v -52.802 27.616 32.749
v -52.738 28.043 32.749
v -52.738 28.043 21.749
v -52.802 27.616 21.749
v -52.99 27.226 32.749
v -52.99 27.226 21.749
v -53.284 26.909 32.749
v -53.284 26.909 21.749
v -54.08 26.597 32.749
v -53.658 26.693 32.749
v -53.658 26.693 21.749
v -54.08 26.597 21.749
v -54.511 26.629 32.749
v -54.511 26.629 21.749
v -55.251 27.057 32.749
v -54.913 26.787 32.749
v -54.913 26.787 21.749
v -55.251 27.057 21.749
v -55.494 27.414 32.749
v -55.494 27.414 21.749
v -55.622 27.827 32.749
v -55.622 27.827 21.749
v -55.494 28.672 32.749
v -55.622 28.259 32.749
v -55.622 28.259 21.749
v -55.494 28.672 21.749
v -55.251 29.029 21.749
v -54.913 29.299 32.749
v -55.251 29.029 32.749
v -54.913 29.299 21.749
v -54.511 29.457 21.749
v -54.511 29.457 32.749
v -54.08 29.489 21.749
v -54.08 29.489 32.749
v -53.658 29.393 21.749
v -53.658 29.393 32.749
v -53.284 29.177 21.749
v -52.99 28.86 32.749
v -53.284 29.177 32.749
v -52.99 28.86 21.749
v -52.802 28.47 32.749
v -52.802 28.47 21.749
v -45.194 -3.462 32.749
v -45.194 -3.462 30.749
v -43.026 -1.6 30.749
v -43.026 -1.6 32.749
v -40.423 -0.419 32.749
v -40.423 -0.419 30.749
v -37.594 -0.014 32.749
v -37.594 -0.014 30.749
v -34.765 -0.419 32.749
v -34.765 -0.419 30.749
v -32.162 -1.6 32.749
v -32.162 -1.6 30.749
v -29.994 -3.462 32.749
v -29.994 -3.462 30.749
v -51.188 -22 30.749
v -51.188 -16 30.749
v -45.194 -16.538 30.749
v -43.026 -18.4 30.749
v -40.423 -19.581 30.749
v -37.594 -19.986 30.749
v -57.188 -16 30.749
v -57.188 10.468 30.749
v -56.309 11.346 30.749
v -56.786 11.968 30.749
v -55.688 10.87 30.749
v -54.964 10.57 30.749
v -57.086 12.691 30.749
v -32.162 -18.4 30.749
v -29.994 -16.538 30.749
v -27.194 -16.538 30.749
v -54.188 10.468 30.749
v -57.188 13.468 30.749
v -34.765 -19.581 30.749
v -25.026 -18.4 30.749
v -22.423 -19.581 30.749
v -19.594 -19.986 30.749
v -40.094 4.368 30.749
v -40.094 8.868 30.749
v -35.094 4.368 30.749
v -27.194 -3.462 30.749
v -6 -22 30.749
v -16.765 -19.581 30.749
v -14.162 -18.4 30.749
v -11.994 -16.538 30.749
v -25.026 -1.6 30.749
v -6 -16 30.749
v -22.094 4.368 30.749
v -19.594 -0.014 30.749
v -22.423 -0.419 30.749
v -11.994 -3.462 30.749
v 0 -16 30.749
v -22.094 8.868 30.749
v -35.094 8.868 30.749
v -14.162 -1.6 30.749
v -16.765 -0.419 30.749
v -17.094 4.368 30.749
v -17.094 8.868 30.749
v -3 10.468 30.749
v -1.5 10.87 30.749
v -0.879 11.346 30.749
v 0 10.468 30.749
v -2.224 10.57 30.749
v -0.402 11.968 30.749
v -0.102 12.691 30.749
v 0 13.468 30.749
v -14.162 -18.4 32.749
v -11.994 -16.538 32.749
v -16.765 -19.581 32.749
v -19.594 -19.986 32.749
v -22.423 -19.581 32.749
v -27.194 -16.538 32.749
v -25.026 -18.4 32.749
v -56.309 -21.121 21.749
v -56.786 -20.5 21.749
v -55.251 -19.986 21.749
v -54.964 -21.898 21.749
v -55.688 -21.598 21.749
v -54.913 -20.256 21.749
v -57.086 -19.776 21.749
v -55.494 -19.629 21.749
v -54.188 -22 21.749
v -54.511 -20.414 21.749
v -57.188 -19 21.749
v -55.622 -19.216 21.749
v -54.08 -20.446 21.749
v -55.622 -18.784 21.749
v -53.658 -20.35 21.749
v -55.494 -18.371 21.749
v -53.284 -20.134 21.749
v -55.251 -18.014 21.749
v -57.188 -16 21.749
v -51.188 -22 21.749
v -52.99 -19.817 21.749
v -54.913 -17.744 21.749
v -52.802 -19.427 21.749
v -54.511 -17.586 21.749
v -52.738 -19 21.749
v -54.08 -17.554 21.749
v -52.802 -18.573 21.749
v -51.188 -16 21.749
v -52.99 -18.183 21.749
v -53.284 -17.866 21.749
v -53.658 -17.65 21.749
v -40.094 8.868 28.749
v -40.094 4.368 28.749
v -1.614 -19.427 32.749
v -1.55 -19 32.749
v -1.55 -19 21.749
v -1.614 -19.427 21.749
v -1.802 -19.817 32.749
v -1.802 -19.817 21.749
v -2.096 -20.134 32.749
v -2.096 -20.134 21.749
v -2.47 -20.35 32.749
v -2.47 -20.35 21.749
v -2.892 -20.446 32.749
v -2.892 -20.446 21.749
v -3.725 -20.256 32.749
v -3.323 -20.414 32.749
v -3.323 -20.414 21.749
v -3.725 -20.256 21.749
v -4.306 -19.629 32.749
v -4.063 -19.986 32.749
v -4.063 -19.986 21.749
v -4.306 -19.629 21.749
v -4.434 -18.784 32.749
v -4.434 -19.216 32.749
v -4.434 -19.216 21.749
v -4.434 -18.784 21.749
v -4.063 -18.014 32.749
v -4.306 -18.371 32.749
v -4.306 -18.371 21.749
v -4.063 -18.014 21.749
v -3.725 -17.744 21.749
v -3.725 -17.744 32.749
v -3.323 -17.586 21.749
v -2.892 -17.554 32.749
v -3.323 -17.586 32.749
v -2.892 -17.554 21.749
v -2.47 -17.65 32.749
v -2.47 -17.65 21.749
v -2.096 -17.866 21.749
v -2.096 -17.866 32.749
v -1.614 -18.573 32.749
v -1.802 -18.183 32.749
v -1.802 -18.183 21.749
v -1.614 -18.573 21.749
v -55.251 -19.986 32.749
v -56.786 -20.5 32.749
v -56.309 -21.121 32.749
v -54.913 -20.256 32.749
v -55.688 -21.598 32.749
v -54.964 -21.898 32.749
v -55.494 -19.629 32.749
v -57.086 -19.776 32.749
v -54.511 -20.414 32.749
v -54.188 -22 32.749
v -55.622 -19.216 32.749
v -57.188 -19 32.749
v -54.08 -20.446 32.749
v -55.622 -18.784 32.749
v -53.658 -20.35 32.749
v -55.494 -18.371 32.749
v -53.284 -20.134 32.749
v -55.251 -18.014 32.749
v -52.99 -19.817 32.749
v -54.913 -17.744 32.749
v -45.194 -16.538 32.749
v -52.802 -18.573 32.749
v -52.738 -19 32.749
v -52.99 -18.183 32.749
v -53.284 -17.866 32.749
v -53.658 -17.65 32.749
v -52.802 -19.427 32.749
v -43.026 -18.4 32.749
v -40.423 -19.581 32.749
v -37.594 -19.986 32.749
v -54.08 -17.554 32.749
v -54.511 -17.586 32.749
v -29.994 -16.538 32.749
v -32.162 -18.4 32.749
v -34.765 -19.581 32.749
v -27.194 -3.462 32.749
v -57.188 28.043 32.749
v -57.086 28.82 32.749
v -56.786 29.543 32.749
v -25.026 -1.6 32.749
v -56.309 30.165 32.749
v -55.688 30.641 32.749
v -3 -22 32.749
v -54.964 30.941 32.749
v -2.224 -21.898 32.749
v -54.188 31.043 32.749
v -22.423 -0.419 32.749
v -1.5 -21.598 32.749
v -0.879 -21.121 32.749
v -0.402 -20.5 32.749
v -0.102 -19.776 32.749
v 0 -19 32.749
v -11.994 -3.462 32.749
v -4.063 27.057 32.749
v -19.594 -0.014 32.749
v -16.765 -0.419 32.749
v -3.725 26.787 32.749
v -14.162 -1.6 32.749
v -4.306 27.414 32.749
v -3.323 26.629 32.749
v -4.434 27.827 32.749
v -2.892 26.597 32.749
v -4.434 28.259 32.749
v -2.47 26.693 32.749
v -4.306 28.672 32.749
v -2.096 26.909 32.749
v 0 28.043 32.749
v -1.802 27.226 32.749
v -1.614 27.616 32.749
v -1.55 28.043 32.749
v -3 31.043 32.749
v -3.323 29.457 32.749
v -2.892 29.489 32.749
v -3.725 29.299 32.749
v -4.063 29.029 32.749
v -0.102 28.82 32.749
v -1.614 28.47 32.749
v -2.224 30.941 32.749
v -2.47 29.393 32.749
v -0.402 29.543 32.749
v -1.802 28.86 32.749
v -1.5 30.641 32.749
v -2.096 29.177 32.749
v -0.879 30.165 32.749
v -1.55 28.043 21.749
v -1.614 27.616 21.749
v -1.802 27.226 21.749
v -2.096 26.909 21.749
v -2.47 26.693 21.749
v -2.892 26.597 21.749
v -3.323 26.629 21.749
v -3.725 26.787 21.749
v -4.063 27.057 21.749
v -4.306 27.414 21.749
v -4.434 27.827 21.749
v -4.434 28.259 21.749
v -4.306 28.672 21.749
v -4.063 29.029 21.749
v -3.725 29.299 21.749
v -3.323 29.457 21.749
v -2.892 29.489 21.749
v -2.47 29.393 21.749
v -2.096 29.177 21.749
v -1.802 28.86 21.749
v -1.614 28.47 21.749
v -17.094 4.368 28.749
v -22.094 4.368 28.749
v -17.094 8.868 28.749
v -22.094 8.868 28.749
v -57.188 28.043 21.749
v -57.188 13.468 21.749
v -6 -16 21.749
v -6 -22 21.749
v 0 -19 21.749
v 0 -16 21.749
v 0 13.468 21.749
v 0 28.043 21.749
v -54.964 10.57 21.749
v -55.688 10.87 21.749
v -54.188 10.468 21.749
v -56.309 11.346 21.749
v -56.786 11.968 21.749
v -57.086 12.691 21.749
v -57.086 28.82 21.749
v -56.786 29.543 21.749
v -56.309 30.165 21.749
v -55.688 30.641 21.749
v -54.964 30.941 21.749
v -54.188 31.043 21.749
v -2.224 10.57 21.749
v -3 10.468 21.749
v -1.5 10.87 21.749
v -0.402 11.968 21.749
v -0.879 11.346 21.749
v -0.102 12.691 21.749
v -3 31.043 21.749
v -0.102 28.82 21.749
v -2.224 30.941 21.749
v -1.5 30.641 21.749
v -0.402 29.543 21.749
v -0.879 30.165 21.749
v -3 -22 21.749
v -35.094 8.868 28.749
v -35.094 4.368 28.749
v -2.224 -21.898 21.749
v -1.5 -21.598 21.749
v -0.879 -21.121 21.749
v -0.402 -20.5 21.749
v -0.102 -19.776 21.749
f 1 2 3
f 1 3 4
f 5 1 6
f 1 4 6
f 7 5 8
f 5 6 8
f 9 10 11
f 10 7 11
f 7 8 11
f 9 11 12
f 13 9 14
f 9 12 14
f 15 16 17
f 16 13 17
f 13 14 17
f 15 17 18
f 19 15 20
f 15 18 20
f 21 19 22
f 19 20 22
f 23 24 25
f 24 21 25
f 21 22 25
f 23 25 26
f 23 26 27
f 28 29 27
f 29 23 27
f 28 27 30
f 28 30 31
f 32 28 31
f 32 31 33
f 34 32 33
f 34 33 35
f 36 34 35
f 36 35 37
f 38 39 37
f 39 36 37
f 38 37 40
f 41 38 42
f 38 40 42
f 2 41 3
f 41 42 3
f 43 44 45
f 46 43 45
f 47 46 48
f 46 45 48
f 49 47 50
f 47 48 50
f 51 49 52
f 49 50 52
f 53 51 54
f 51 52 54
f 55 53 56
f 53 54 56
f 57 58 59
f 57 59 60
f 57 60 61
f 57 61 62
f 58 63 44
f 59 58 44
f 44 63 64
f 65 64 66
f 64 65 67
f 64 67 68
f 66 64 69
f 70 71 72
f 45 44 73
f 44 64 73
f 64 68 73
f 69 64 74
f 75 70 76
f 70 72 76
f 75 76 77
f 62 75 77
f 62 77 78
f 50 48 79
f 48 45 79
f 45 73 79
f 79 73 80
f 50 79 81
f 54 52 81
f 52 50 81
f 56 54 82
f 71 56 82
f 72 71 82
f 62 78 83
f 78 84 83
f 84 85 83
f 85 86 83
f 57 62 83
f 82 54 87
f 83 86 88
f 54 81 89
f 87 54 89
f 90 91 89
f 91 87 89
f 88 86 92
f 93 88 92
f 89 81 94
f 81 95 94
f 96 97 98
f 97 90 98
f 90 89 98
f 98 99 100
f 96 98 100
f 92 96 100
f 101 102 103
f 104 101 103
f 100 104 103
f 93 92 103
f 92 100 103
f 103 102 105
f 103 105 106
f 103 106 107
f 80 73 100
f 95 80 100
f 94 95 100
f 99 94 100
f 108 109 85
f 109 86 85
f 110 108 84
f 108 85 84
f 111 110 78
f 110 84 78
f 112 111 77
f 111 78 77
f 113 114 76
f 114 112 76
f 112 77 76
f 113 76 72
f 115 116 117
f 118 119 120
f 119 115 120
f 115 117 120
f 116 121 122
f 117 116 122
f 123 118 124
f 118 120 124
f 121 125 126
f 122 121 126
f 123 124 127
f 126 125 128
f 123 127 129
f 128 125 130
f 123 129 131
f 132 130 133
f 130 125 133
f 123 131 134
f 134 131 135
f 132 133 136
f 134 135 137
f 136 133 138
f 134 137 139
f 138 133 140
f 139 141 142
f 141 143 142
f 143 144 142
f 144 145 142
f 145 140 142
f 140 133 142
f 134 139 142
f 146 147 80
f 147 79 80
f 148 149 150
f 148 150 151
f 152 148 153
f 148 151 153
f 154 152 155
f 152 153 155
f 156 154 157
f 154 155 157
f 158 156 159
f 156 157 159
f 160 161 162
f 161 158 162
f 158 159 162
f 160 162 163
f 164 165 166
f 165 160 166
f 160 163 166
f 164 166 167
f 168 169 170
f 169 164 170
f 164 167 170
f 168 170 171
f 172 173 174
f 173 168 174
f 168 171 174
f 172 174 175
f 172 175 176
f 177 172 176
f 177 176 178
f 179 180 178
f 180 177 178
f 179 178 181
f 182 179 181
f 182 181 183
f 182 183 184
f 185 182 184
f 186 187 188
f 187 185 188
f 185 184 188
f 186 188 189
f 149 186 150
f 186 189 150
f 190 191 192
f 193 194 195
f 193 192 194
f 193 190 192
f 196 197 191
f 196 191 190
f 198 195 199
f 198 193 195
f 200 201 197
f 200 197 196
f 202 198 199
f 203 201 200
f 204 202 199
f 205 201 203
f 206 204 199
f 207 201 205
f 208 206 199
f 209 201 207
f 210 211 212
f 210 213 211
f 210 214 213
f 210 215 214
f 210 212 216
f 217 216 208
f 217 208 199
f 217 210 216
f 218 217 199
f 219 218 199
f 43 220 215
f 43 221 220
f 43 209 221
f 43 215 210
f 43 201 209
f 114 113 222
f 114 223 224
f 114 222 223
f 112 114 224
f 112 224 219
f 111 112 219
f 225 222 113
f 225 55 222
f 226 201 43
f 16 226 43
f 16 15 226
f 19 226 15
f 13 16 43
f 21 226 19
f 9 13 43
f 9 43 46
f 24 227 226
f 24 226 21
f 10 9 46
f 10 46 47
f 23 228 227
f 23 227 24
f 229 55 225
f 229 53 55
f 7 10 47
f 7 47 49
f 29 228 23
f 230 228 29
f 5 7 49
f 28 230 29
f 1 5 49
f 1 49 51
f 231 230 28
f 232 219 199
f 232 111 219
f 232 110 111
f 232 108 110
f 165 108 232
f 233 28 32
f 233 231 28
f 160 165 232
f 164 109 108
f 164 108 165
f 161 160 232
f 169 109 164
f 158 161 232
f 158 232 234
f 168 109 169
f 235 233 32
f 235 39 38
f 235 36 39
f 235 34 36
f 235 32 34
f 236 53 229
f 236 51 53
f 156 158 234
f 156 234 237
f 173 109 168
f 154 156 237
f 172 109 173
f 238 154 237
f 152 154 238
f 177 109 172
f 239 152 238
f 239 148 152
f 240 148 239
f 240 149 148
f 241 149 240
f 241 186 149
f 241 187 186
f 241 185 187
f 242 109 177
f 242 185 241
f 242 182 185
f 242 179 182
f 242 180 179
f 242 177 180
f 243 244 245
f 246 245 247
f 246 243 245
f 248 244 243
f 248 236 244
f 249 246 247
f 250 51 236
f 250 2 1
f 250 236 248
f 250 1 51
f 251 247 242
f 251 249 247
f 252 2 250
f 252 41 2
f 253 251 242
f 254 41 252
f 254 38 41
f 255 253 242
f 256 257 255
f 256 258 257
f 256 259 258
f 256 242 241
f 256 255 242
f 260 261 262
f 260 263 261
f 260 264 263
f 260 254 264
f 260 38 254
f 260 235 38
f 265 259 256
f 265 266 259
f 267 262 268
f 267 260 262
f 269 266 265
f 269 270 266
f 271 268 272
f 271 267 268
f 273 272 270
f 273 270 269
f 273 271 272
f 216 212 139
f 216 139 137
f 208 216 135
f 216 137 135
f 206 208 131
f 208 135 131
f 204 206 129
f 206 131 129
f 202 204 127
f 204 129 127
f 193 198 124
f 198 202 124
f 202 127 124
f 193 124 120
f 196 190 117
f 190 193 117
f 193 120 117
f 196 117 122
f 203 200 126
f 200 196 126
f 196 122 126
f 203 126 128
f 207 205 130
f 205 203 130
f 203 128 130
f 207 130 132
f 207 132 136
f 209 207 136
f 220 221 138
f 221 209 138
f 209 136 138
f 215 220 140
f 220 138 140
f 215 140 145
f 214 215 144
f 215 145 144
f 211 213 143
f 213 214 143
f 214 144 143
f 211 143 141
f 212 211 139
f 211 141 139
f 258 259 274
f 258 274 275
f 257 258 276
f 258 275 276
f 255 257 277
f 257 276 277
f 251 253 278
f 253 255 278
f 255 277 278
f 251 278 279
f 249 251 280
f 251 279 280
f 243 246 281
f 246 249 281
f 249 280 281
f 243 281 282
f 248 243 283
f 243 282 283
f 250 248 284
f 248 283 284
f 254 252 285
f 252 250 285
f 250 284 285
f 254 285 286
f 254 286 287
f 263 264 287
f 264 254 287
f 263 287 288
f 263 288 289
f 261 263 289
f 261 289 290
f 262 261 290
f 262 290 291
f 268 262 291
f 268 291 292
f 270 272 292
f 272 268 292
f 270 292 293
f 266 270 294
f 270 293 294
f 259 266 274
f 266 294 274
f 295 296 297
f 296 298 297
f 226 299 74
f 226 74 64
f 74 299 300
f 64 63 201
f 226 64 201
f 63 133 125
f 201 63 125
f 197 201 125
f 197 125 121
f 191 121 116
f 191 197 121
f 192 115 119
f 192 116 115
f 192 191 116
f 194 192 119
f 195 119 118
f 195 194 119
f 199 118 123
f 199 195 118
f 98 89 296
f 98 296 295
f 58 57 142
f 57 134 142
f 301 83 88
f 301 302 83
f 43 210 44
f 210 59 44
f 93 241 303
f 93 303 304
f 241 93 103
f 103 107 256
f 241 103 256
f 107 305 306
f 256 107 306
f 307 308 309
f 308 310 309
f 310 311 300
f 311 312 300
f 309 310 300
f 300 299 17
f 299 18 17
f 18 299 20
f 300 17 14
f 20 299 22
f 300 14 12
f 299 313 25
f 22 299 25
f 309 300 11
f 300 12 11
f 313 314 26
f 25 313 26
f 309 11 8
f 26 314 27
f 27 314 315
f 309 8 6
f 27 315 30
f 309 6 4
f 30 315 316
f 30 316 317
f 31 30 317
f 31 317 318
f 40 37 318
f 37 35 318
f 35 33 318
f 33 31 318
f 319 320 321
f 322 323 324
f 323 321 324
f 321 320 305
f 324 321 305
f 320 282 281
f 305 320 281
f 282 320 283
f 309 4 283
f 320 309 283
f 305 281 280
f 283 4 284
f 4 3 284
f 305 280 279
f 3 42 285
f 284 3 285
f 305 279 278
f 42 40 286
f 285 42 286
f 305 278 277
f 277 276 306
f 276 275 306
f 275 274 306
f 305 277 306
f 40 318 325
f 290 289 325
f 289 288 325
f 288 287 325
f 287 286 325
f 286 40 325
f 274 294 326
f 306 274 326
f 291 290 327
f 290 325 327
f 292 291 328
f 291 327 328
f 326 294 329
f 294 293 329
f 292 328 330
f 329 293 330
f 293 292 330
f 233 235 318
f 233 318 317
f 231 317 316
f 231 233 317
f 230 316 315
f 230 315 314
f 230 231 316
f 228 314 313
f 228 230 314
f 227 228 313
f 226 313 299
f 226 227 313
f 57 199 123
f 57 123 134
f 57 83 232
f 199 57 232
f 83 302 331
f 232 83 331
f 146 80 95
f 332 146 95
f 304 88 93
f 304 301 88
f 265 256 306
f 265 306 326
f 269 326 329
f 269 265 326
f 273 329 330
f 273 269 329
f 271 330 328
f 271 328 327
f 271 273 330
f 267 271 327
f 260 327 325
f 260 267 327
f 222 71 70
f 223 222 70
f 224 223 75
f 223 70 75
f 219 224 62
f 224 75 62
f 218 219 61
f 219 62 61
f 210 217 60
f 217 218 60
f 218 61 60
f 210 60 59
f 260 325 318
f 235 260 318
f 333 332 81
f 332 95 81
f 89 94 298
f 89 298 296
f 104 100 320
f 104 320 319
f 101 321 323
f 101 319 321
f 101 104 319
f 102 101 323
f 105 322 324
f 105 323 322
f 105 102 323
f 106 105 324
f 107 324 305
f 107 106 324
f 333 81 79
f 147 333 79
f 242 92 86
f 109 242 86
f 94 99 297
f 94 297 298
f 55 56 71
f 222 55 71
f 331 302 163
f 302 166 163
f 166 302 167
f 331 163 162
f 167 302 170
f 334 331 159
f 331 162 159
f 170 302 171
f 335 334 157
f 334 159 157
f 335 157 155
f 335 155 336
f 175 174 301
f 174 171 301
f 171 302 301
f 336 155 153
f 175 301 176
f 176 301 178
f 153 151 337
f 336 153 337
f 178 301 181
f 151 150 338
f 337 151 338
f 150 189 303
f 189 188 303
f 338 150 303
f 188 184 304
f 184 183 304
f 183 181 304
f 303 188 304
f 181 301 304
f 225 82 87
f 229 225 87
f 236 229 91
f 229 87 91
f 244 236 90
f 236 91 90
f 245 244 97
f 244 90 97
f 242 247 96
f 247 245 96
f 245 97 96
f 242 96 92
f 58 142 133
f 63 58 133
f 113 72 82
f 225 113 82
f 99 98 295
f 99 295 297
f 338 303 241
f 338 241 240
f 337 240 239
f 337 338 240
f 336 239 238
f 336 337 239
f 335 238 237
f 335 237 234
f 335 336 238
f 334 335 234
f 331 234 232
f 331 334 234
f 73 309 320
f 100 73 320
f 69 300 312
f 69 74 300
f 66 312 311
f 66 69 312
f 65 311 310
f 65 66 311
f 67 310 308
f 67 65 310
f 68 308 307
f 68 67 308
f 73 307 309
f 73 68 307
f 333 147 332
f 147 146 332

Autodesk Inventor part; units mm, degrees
ref_plane "YZ Plane" through (0, 0, 0) normal (1, 0, 0) x (0, 1, 0)
ref_plane "XZ Plane" through (0, 0, 0) normal (0, 1, 0) x (-1, 0, 0)
ref_plane "Work Plane1" through (-29.0856, 4.4467, 21.749) normal (0, 0, 1) x (1, 0, 0)
ref_plane "Work Plane2" through (-5, -17, 36.649) normal (0, 0, -1) x (1, 0, 0)
ref_plane "Work Plane3" through (-40.5939, -3, 26.249) normal (0, 0, -1) x (0, 1, 0)
sketch "Sketch1" plane through (-29.0856, 4.4467, 21.749) normal (0, 0, 1) x (1, 0, 0)
  arc A0 (29.0856, 24.0967) -> (26.5856, 26.5967) centre (26.5856, 24.0967) ccw projected
  line L0 (26.5856, 26.5967) -> (-25.6023, 26.5967) projected
  arc A1 (-25.6023, 26.5967) -> (-28.1023, 24.0967) centre (-25.6023, 24.0967) ccw projected
  line L1 (-28.1023, 24.0967) -> (-28.1023, -23.9467) projected
  arc A2 (-28.1023, -23.9467) -> (-25.6023, -26.4467) centre (-25.6023, -23.9467) ccw projected
  line L2 (-25.6023, -26.4467) -> (26.5856, -26.4467) projected
  line L3 (29.0856, -23.9467) -> (29.0856, 24.0967)
  circle A3 centre (26.0856, -23.4467) radius 1.45 construction
  line L4 (0.4916, -38.3665) -> (0.4916, 43.9409) construction
  line L5 (29.0856, 26.5967) -> (-28.1023, 26.5967)
  line L6 (-28.1023, 26.5967) -> (-28.1023, 6.0209)
  line L7 (-28.1023, 6.0209) -> (29.0856, 6.0209)
  line L8 (29.0856, 6.0209) -> (29.0856, 26.5967)
  line L9 (30.8116, -0.0755) -> (30.8114, -0.0755)
  line L10 (29.0856, -23.9467) -> (29.0856, -26.4467)
  line L11 (29.0856, -26.4467) -> (26.5856, -26.4467)
  line L12 (-25.6023, -26.4467) -> (-28.1023, -26.4467)
  line L13 (-28.1023, -26.4467) -> (-28.1023, -23.9467)
  circle A4 centre (26.0856, -23.4467) radius 3 construction
  circle A5 centre (26.0856, -23.4467) radius 1.45
  circle A6 centre (-25.1024, -23.4467) radius 1.45 construction
  circle A7 centre (-25.1024, -23.4467) radius 1.45
  circle A8 centre (26.0856, 23.5963) radius 1.45 construction
  circle A9 centre (26.0856, 23.5963) radius 1.45
  circle A10 centre (-25.1024, 23.5963) radius 1.45 construction
  circle A11 centre (-25.1024, 23.5963) radius 1.45
  line L14 (29.0856, -26.4467) -> (23.0856, -26.4467)
  line L15 (23.0856, -26.4467) -> (23.0856, -20.4467)
  line L16 (23.0856, -20.4467) -> (29.0856, -20.4467)
  line L17 (29.0856, -20.4467) -> (29.0856, -26.4467)
  line L18 (-28.1023, -26.4467) -> (-22.1023, -26.4467)
  line L19 (-22.1023, -26.4467) -> (-22.1023, -20.4467)
  line L20 (-22.1023, -20.4467) -> (-28.1023, -20.4467)
  line L21 (-28.1023, -20.4467) -> (-28.1023, -26.4467)
  spline S0 degree 3 poles (31.7798, -5.9724) (31.66, -5.7823) (31.4802, -5.4972) (31.2591, -5.1058) (31.1003, -4.8085) (30.9498, -4.5069) (30.8081, -4.201) (30.6761, -3.8909) (30.5547, -3.5764) (30.4456, -3.2574) (30.3497, -2.9341) (30.2872, -2.6602) (30.2421, -2.4401) (30.1945, -2.2782) (30.1301, -2.1222) (30.0461, -1.9754) (29.9577, -1.8658) (29.8777, -1.7866) (29.8102, -1.7361) (29.741, -1.6877) (29.6647, -1.6516) (29.5872, -1.6181) (29.5051, -1.5983) (29.4223, -1.5815) (29.3098, -1.5775) (29.1694, -1.5801) (29.0291, -1.5775) (28.9165, -1.5815) (28.8338, -1.5983) (28.7517, -1.6181) (28.6742, -1.6516) (28.5979, -1.6877) (28.5287, -1.7361) (28.4611, -1.7866) (28.3812, -1.8658) (28.2927, -1.9754) (28.2088, -2.1222) (28.1444, -2.2782) (28.0967, -2.4401) (28.0516, -2.6602) (27.9892, -2.9341) (27.8932, -3.2574) (27.7842, -3.5764) (27.6628, -3.8909) (27.5307, -4.201) (27.389, -4.5069) (27.2385, -4.8085) (27.0797, -5.1058) (26.8587, -5.4972) (26.6789, -5.7823) (26.559, -5.9724) knots -1.0784 -1.0784 -1.0784 -1.0784 -1.010995 -0.977291 -0.943586 -0.909882 -0.876178 -0.842474 -0.80877 -0.775067 -0.741365 -0.707665 -0.690816 -0.67397 -0.657123 -0.640284 -0.623449 -0.615023 -0.606598 -0.598176 -0.589749 -0.581327 -0.572901 -0.564477 -0.556053 -0.5392 -0.522347 -0.513923 -0.505499 -0.497074 -0.488651 -0.480225 -0.471802 -0.463377 -0.454951 -0.438116 -0.421277 -0.40443 -0.387584 -0.370735 -0.337035 -0.303333 -0.26963 -0.235926 -0.202222 -0.168518 -0.134814 -0.101109 -0.067405 0 0 0 0 construction
  line L22 (26.559, -5.9724) -> (25.4968, -5.9724) construction
  spline S1 degree 3 poles (25.4968, -5.9724) (25.377, -5.7823) (25.1972, -5.4972) (24.9761, -5.1058) (24.8173, -4.8085) (24.6668, -4.5069) (24.5251, -4.201) (24.3931, -3.8909) (24.2717, -3.5764) (24.1626, -3.2574) (24.0667, -2.9341) (24.0042, -2.6602) (23.9591, -2.4401) (23.9115, -2.2782) (23.8471, -2.1222) (23.7631, -1.9754) (23.6747, -1.8658) (23.5947, -1.7866) (23.5272, -1.7361) (23.458, -1.6877) (23.3817, -1.6516) (23.3042, -1.6181) (23.2221, -1.5983) (23.1393, -1.5815) (23.0268, -1.5775) (22.8864, -1.5801) (22.7461, -1.5775) (22.6335, -1.5815) (22.5508, -1.5983) (22.4687, -1.6181) (22.3912, -1.6516) (22.3149, -1.6877) (22.2457, -1.7361) (22.1781, -1.7866) (22.0982, -1.8658) (22.0097, -1.9754) (21.9258, -2.1222) (21.8614, -2.2782) (21.8137, -2.4401) (21.7686, -2.6602) (21.7062, -2.9341) (21.6102, -3.2574) (21.5012, -3.5764) (21.3798, -3.8909) (21.2477, -4.201) (21.106, -4.5069) (20.9555, -4.8085) (20.7967, -5.1058) (20.5757, -5.4972) (20.3959, -5.7823) (20.276, -5.9724) knots -1.0784 -1.0784 -1.0784 -1.0784 -1.010995 -0.977291 -0.943586 -0.909882 -0.876178 -0.842474 -0.80877 -0.775067 -0.741365 -0.707665 -0.690816 -0.67397 -0.657123 -0.640284 -0.623449 -0.615023 -0.606598 -0.598176 -0.589749 -0.581327 -0.572901 -0.564477 -0.556053 -0.5392 -0.522347 -0.513923 -0.505499 -0.497074 -0.488651 -0.480225 -0.471802 -0.463377 -0.454951 -0.438116 -0.421277 -0.40443 -0.387584 -0.370735 -0.337035 -0.303333 -0.26963 -0.235926 -0.202222 -0.168518 -0.134814 -0.101109 -0.067405 0 0 0 0 construction
  line L23 (20.276, -5.9724) -> (19.2138, -5.9724) construction
  spline S2 degree 3 poles (19.2138, -5.9724) (19.094, -5.7823) (18.9142, -5.4972) (18.6931, -5.1058) (18.5343, -4.8085) (18.3838, -4.5069) (18.2421, -4.201) (18.1101, -3.8909) (17.9887, -3.5764) (17.8796, -3.2574) (17.7837, -2.9341) (17.7212, -2.6602) (17.6761, -2.4401) (17.6285, -2.2782) (17.5641, -2.1222) (17.4801, -1.9754) (17.3917, -1.8658) (17.3117, -1.7866) (17.2442, -1.7361) (17.175, -1.6877) (17.0987, -1.6516) (17.0212, -1.6181) (16.9391, -1.5983) (16.8563, -1.5815) (16.7438, -1.5775) (16.6034, -1.5801) (16.4631, -1.5775) (16.3505, -1.5815) (16.2678, -1.5983) (16.1857, -1.6181) (16.1082, -1.6516) (16.0319, -1.6877) (15.9627, -1.7361) (15.8951, -1.7866) (15.8152, -1.8658) (15.7267, -1.9754) (15.6428, -2.1222) (15.5784, -2.2782) (15.5307, -2.4401) (15.4856, -2.6602) (15.4232, -2.9341) (15.3272, -3.2574) (15.2182, -3.5764) (15.0968, -3.8909) (14.9647, -4.201) (14.823, -4.5069) (14.6725, -4.8085) (14.5137, -5.1058) (14.2927, -5.4972) (14.1129, -5.7823) (13.993, -5.9724) knots -1.0784 -1.0784 -1.0784 -1.0784 -1.010995 -0.977291 -0.943586 -0.909882 -0.876178 -0.842474 -0.80877 -0.775067 -0.741365 -0.707665 -0.690816 -0.67397 -0.657123 -0.640284 -0.623449 -0.615023 -0.606598 -0.598176 -0.589749 -0.581327 -0.572901 -0.564477 -0.556053 -0.5392 -0.522347 -0.513923 -0.505499 -0.497074 -0.488651 -0.480225 -0.471802 -0.463377 -0.454951 -0.438116 -0.421277 -0.40443 -0.387584 -0.370735 -0.337035 -0.303333 -0.26963 -0.235926 -0.202222 -0.168518 -0.134814 -0.101109 -0.067405 0 0 0 0 construction
  line L24 (13.993, -5.9724) -> (12.9308, -5.9724) construction
  spline S3 degree 3 poles (12.9308, -5.9724) (12.811, -5.7823) (12.6312, -5.4972) (12.4101, -5.1058) (12.2513, -4.8085) (12.1008, -4.5069) (11.9591, -4.201) (11.8271, -3.8909) (11.7057, -3.5764) (11.5966, -3.2574) (11.5007, -2.9341) (11.4382, -2.6602) (11.3931, -2.4401) (11.3455, -2.2782) (11.2811, -2.1222) (11.1971, -1.9754) (11.1087, -1.8658) (11.0287, -1.7866) (10.9612, -1.7361) (10.892, -1.6877) (10.8157, -1.6516) (10.7382, -1.6181) (10.6561, -1.5983) (10.5733, -1.5815) (10.4608, -1.5775) (10.3204, -1.5801) (10.1801, -1.5775) (10.0675, -1.5815) (9.9848, -1.5983) (9.9027, -1.6181) (9.8252, -1.6516) (9.7489, -1.6877) (9.6797, -1.7361) (9.6121, -1.7866) (9.5322, -1.8658) (9.4437, -1.9754) (9.3598, -2.1222) (9.2954, -2.2782) (9.2477, -2.4401) (9.2026, -2.6602) (9.1402, -2.9341) (9.0442, -3.2574) (8.9352, -3.5764) (8.8138, -3.8909) (8.6817, -4.201) (8.54, -4.5069) (8.3895, -4.8085) (8.2307, -5.1058) (8.0097, -5.4972) (7.8299, -5.7823) (7.71, -5.9724) knots -1.0784 -1.0784 -1.0784 -1.0784 -1.010995 -0.977291 -0.943586 -0.909882 -0.876178 -0.842474 -0.80877 -0.775067 -0.741365 -0.707665 -0.690816 -0.67397 -0.657123 -0.640284 -0.623449 -0.615023 -0.606598 -0.598176 -0.589749 -0.581327 -0.572901 -0.564477 -0.556053 -0.5392 -0.522347 -0.513923 -0.505499 -0.497074 -0.488651 -0.480225 -0.471802 -0.463377 -0.454951 -0.438116 -0.421277 -0.40443 -0.387584 -0.370735 -0.337035 -0.303333 -0.26963 -0.235926 -0.202222 -0.168518 -0.134814 -0.101109 -0.067405 0 0 0 0 construction
  line L25 (7.71, -5.9724) -> (6.6478, -5.9724) construction
  spline S4 degree 3 poles (6.6478, -5.9724) (6.528, -5.7823) (6.3482, -5.4972) (6.1271, -5.1058) (5.9683, -4.8085) (5.8178, -4.5069) (5.6761, -4.201) (5.5441, -3.8909) (5.4227, -3.5764) (5.3136, -3.2574) (5.2177, -2.9341) (5.1552, -2.6602) (5.1101, -2.4401) (5.0625, -2.2782) (4.9981, -2.1222) (4.9141, -1.9754) (4.8257, -1.8658) (4.7457, -1.7866) (4.6782, -1.7361) (4.609, -1.6877) (4.5327, -1.6516) (4.4552, -1.6181) (4.3731, -1.5983) (4.2903, -1.5815) (4.1778, -1.5775) (4.0374, -1.5801) (3.8971, -1.5775) (3.7845, -1.5815) (3.7018, -1.5983) (3.6197, -1.6181) (3.5422, -1.6516) (3.4659, -1.6877) (3.3967, -1.7361) (3.3291, -1.7866) (3.2492, -1.8658) (3.1607, -1.9754) (3.0768, -2.1222) (3.0124, -2.2782) (2.9647, -2.4401) (2.9196, -2.6602) (2.8572, -2.9341) (2.7612, -3.2574) (2.6522, -3.5764) (2.5308, -3.8909) (2.3987, -4.201) (2.257, -4.5069) (2.1065, -4.8085) (1.9477, -5.1058) (1.7267, -5.4972) (1.5469, -5.7823) (1.427, -5.9724) knots -1.0784 -1.0784 -1.0784 -1.0784 -1.010995 -0.977291 -0.943586 -0.909882 -0.876178 -0.842474 -0.80877 -0.775067 -0.741365 -0.707665 -0.690816 -0.67397 -0.657123 -0.640284 -0.623449 -0.615023 -0.606598 -0.598176 -0.589749 -0.581327 -0.572901 -0.564477 -0.556053 -0.5392 -0.522347 -0.513923 -0.505499 -0.497074 -0.488651 -0.480225 -0.471802 -0.463377 -0.454951 -0.438116 -0.421277 -0.40443 -0.387584 -0.370735 -0.337035 -0.303333 -0.26963 -0.235926 -0.202222 -0.168518 -0.134814 -0.101109 -0.067405 0 0 0 0 construction
  line L26 (1.427, -5.9724) -> (0.3648, -5.9724) construction
  spline S5 degree 3 poles (0.3648, -5.9724) (0.245, -5.7823) (0.0652, -5.4972) (-0.1559, -5.1058) (-0.3147, -4.8085) (-0.4652, -4.5069) (-0.6069, -4.201) (-0.7389, -3.8909) (-0.8603, -3.5764) (-0.9694, -3.2574) (-1.0653, -2.9341) (-1.1278, -2.6602) (-1.1729, -2.4401) (-1.2205, -2.2782) (-1.2849, -2.1222) (-1.3689, -1.9754) (-1.4573, -1.8658) (-1.5373, -1.7866) (-1.6048, -1.7361) (-1.674, -1.6877) (-1.7503, -1.6516) (-1.8278, -1.6181) (-1.9099, -1.5983) (-1.9927, -1.5815) (-2.1052, -1.5775) (-2.2456, -1.5801) (-2.3859, -1.5775) (-2.4985, -1.5815) (-2.5812, -1.5983) (-2.6633, -1.6181) (-2.7408, -1.6516) (-2.8171, -1.6877) (-2.8863, -1.7361) (-2.9539, -1.7866) (-3.0338, -1.8658) (-3.1223, -1.9754) (-3.2062, -2.1222) (-3.2706, -2.2782) (-3.3183, -2.4401) (-3.3634, -2.6602) (-3.4258, -2.9341) (-3.5218, -3.2574) (-3.6308, -3.5764) (-3.7522, -3.8909) (-3.8843, -4.201) (-4.026, -4.5069) (-4.1765, -4.8085) (-4.3353, -5.1058) (-4.5563, -5.4972) (-4.7361, -5.7823) (-4.856, -5.9724) knots -1.0784 -1.0784 -1.0784 -1.0784 -1.010995 -0.977291 -0.943586 -0.909882 -0.876178 -0.842474 -0.80877 -0.775067 -0.741365 -0.707665 -0.690816 -0.67397 -0.657123 -0.640284 -0.623449 -0.615023 -0.606598 -0.598176 -0.589749 -0.581327 -0.572901 -0.564477 -0.556053 -0.5392 -0.522347 -0.513923 -0.505499 -0.497074 -0.488651 -0.480225 -0.471802 -0.463377 -0.454951 -0.438116 -0.421277 -0.40443 -0.387584 -0.370735 -0.337035 -0.303333 -0.26963 -0.235926 -0.202222 -0.168518 -0.134814 -0.101109 -0.067405 0 0 0 0 construction
  line L27 (-4.856, -5.9724) -> (-5.9182, -5.9724) construction
  spline S6 degree 3 poles (-5.9182, -5.9724) (-6.038, -5.7823) (-6.2178, -5.4972) (-6.4389, -5.1058) (-6.5977, -4.8085) (-6.7482, -4.5069) (-6.8899, -4.201) (-7.0219, -3.8909) (-7.1433, -3.5764) (-7.2524, -3.2574) (-7.3483, -2.9341) (-7.4108, -2.6602) (-7.4559, -2.4401) (-7.5035, -2.2782) (-7.5679, -2.1222) (-7.6519, -1.9754) (-7.7403, -1.8658) (-7.8203, -1.7866) (-7.8878, -1.7361) (-7.957, -1.6877) (-8.0333, -1.6516) (-8.1108, -1.6181) (-8.1929, -1.5983) (-8.2757, -1.5815) (-8.3882, -1.5775) (-8.5286, -1.5801) (-8.6689, -1.5775) (-8.7815, -1.5815) (-8.8642, -1.5983) (-8.9463, -1.6181) (-9.0238, -1.6516) (-9.1001, -1.6877) (-9.1693, -1.7361) (-9.2369, -1.7866) (-9.3168, -1.8658) (-9.4053, -1.9754) (-9.4892, -2.1222) (-9.5536, -2.2782) (-9.6013, -2.4401) (-9.6464, -2.6602) (-9.7088, -2.9341) (-9.8048, -3.2574) (-9.9138, -3.5764) (-10.0352, -3.8909) (-10.1673, -4.201) (-10.309, -4.5069) (-10.4595, -4.8085) (-10.6183, -5.1058) (-10.8393, -5.4972) (-11.0191, -5.7823) (-11.139, -5.9724) knots -1.0784 -1.0784 -1.0784 -1.0784 -1.010995 -0.977291 -0.943586 -0.909882 -0.876178 -0.842474 -0.80877 -0.775067 -0.741365 -0.707665 -0.690816 -0.67397 -0.657123 -0.640284 -0.623449 -0.615023 -0.606598 -0.598176 -0.589749 -0.581327 -0.572901 -0.564477 -0.556053 -0.5392 -0.522347 -0.513923 -0.505499 -0.497074 -0.488651 -0.480225 -0.471802 -0.463377 -0.454951 -0.438116 -0.421277 -0.40443 -0.387584 -0.370735 -0.337035 -0.303333 -0.26963 -0.235926 -0.202222 -0.168518 -0.134814 -0.101109 -0.067405 0 0 0 0 construction
  line L28 (-11.139, -5.9724) -> (-12.2012, -5.9724) construction
  spline S7 degree 3 poles (-12.2012, -5.9724) (-12.321, -5.7823) (-12.5008, -5.4972) (-12.7219, -5.1058) (-12.8807, -4.8085) (-13.0312, -4.5069) (-13.1729, -4.201) (-13.3049, -3.8909) (-13.4263, -3.5764) (-13.5354, -3.2574) (-13.6313, -2.9341) (-13.6938, -2.6602) (-13.7389, -2.4401) (-13.7865, -2.2782) (-13.8509, -2.1222) (-13.9349, -1.9754) (-14.0233, -1.8658) (-14.1033, -1.7866) (-14.1708, -1.7361) (-14.24, -1.6877) (-14.3163, -1.6516) (-14.3938, -1.6181) (-14.4759, -1.5983) (-14.5587, -1.5815) (-14.6712, -1.5775) (-14.8116, -1.5801) (-14.9519, -1.5775) (-15.0645, -1.5815) (-15.1472, -1.5983) (-15.2293, -1.6181) (-15.3068, -1.6516) (-15.3831, -1.6877) (-15.4523, -1.7361) (-15.5199, -1.7866) (-15.5998, -1.8658) (-15.6883, -1.9754) (-15.7722, -2.1222) (-15.8366, -2.2782) (-15.8843, -2.4401) (-15.9294, -2.6602) (-15.9918, -2.9341) (-16.0878, -3.2574) (-16.1968, -3.5764) (-16.3182, -3.8909) (-16.4503, -4.201) (-16.592, -4.5069) (-16.7425, -4.8085) (-16.9013, -5.1058) (-17.1223, -5.4972) (-17.3021, -5.7823) (-17.422, -5.9724) knots -1.0784 -1.0784 -1.0784 -1.0784 -1.010995 -0.977291 -0.943586 -0.909882 -0.876178 -0.842474 -0.80877 -0.775067 -0.741365 -0.707665 -0.690816 -0.67397 -0.657123 -0.640284 -0.623449 -0.615023 -0.606598 -0.598176 -0.589749 -0.581327 -0.572901 -0.564477 -0.556053 -0.5392 -0.522347 -0.513923 -0.505499 -0.497074 -0.488651 -0.480225 -0.471802 -0.463377 -0.454951 -0.438116 -0.421277 -0.40443 -0.387584 -0.370735 -0.337035 -0.303333 -0.26963 -0.235926 -0.202222 -0.168518 -0.134814 -0.101109 -0.067405 0 0 0 0 construction
  line L29 (-17.422, -5.9724) -> (-18.4842, -5.9724) construction
  spline S8 degree 3 poles (-18.4842, -5.9724) (-18.604, -5.7823) (-18.7838, -5.4972) (-19.0049, -5.1058) (-19.1637, -4.8085) (-19.3142, -4.5069) (-19.4559, -4.201) (-19.5879, -3.8909) (-19.7093, -3.5764) (-19.8184, -3.2574) (-19.9143, -2.9341) (-19.9768, -2.6602) (-20.0219, -2.4401) (-20.0695, -2.2782) (-20.1339, -2.1222) (-20.2179, -1.9754) (-20.3063, -1.8658) (-20.3863, -1.7866) (-20.4538, -1.7361) (-20.523, -1.6877) (-20.5993, -1.6516) (-20.6768, -1.6181) (-20.7589, -1.5983) (-20.8417, -1.5815) (-20.9542, -1.5775) (-21.0946, -1.5801) (-21.2349, -1.5775) (-21.3475, -1.5815) (-21.4302, -1.5983) (-21.5123, -1.6181) (-21.5898, -1.6516) (-21.6661, -1.6877) (-21.7353, -1.7361) (-21.8029, -1.7866) (-21.8828, -1.8658) (-21.9713, -1.9754) (-22.0552, -2.1222) (-22.1196, -2.2782) (-22.1673, -2.4401) (-22.2124, -2.6602) (-22.2748, -2.9341) (-22.3708, -3.2574) (-22.4798, -3.5764) (-22.6012, -3.8909) (-22.7333, -4.201) (-22.875, -4.5069) (-23.0255, -4.8085) (-23.1843, -5.1058) (-23.4053, -5.4972) (-23.5851, -5.7823) (-23.705, -5.9724) knots -1.0784 -1.0784 -1.0784 -1.0784 -1.010995 -0.977291 -0.943586 -0.909882 -0.876178 -0.842474 -0.80877 -0.775067 -0.741365 -0.707665 -0.690816 -0.67397 -0.657123 -0.640284 -0.623449 -0.615023 -0.606598 -0.598176 -0.589749 -0.581327 -0.572901 -0.564477 -0.556053 -0.5392 -0.522347 -0.513923 -0.505499 -0.497074 -0.488651 -0.480225 -0.471802 -0.463377 -0.454951 -0.438116 -0.421277 -0.40443 -0.387584 -0.370735 -0.337035 -0.303333 -0.26963 -0.235926 -0.202222 -0.168518 -0.134814 -0.101109 -0.067405 0 0 0 0 construction
  line L30 (-23.705, -5.9724) -> (-24.7672, -5.9724) construction
  spline S9 degree 3 poles (-24.7672, -5.9724) (-25.0203, -5.5709) (-25.5973, -4.6557) (-26.3217, -2.6647) (-26.2743, -2.3174) (-26.6017, -1.8348) (-26.7085, -1.7546) (-26.812, -1.685) (-26.9085, -1.6251) (-27.2021, -1.5665) (-27.3381, -1.5791) (-27.5882, -1.5782) (-27.6989, -1.5807) (-27.923, -1.671) (-28.0168, -1.7314) (-28.1559, -1.8474) (-28.2174, -1.9297) (-28.3263, -2.0881) (-28.3821, -2.216) (-28.4787, -2.5326) (-28.4942, -2.6936) (-28.9709, -4.4107) (-29.8122, -5.6937) (-29.988, -5.9724) knots 0 0 0 0 0.142394 0.142394 0.262557 0.262557 0.314666 0.314666 0.34653 0.34653 0.372217 0.372217 0.394622 0.394622 0.411062 0.411062 0.432958 0.432958 0.48678 0.48678 0.562983 0.562983 0.900876 0.900876 0.900876 0.900876 construction
  line L31 (-29.988, -5.9724) -> (-29.988, 5.9209) construction
  line L32 (-29.988, 5.9209) -> (31.78, 5.9209) construction
  line L33 (31.78, 5.9209) -> (31.78, -5.9724) construction
  line L34 (31.78, -5.9724) -> (31.7798, -5.9724) construction
  point P0 (19.0856, -26.4467)
  point P1 (29.0856, -16.4467)
  point P2 (-28.1023, 6.0209)
  point P3 (29.0856, 6.0209)
  point P4 (-28.1023, -20.4467)
  point P5 (-25.6023, -26.4467)
  point P6 (-22.1023, -26.4467)
  point P7 (-25.6023, 26.5967)
  point P8 (-28.1023, 24.0967)
  point P9 (23.0856, -26.4467)
  point P10 (-28.1023, 24.0967)
  point P11 (-25.6023, 26.5967)
  point P12 (-28.1023, 6.0209)
  point P13 (29.0856, 6.0209)
  dimension "d56" = 0
  dimension "d68" = 3
  dimension "d69" = 3
  dimension "d72" = 51.188
  dimension "d75" = 47.043
  dimension "d93" = 0.1
extrude "Extrusion1" add sketch "Sketch1" along normal blind 9 contours L3 L7 L1 A1 L0 A0 | A0 L5 L8 | A1 L6 L5 | L3 L10 L11 L2 L15 L16 | L20 L19 L2 A2 L1 | A2 L12 L13
sketch "Sketch4" plane through (-29.0856, 4.4467, 30.749) normal (0, 0, 1) x (1, 0, 0)
  line L0 (-28.1023, -26.4467) -> (29.0856, -26.4467) projected
  line L1 (29.0856, 26.5967) -> (-28.1023, 26.5967) projected
  line L2 (29.0856, -26.4467) -> (-28.1023, -26.4467)
  line L3 (-28.1023, -26.4467) -> (-28.1023, 26.5967)
  line L4 (-28.1023, 26.5967) -> (29.0856, 26.5967)
  line L5 (29.0856, 26.5967) -> (29.0856, -26.4467)
  line L6 (0.4916, -26.4467) -> (0.4916, 26.5967) construction
  line L7 (11.9917, 4.4209) -> (6.9917, 4.4209)
  line L8 (6.9917, 4.4209) -> (6.9917, -0.0791)
  line L9 (6.9917, -0.0791) -> (11.9917, -0.0791)
  line L10 (11.9917, -0.0791) -> (11.9917, 4.4209)
  line L11 (11.9917, 4.4209) -> (6.9917, -0.0791) construction
  line L12 (6.9917, 4.4209) -> (11.9917, -0.0791) construction
  line L13 (-11.0084, 4.4209) -> (-6.0084, 4.4209)
  line L14 (-6.0084, 4.4209) -> (-6.0084, -0.0791)
  line L15 (-6.0084, -0.0791) -> (-11.0084, -0.0791)
  line L16 (-11.0084, -0.0791) -> (-11.0084, 4.4209)
  circle A0 centre (26.0856, 23.5963) radius 1.45 projected
  circle A1 centre (26.0856, -23.4467) radius 1.45 projected
  circle A2 centre (-25.1024, -23.4467) radius 1.45 projected
  circle A3 centre (-25.1024, 23.5963) radius 1.45 projected
  line L17 (29.78, 4.9209) -> (29.78, -0.5791) construction
  line L18 (-27.988, 4.9209) -> (29.78, 4.9209) construction
  line L19 (-27.988, -0.5791) -> (-27.988, 4.9209) construction
  line L20 (29.78, -0.5791) -> (-27.988, -0.5791) construction
  arc A4 (16.9917, -7.9467) -> (1.9917, -7.9467) centre (9.4917, -14.5611) ccw construction
  line L21 (1.9917, -20.9467) -> (1.9917, -7.9467) construction
  arc A5 (1.9917, -20.9467) -> (16.9917, -20.9467) centre (9.4917, -14.3323) ccw construction
  line L22 (16.9917, -7.9467) -> (16.9917, -20.9467) construction
  arc A6 (-16.0083, -20.9467) -> (-1.0083, -20.9467) centre (-8.5083, -14.3323) ccw construction
  line L23 (-1.0083, -7.9467) -> (-1.0083, -20.9467) construction
  arc A7 (-1.0083, -7.9467) -> (-16.0083, -7.9467) centre (-8.5083, -14.5611) ccw construction
  line L24 (-16.0083, -20.9467) -> (-16.0083, -7.9467) construction
  arc A8 (1.8917, -20.9844) -> (17.0917, -20.9844) centre (9.4917, -14.3323) ccw
  line L25 (1.8917, -20.9844) -> (1.8917, -7.909)
  arc A9 (17.0917, -7.909) -> (1.8917, -7.909) centre (9.4917, -14.5611) ccw
  line L26 (17.0917, -7.909) -> (17.0917, -20.9844)
  arc A10 (-16.1083, -20.9844) -> (-0.9083, -20.9844) centre (-8.5083, -14.3323) ccw
  line L27 (-16.1083, -20.9844) -> (-16.1083, -7.909)
  arc A11 (-0.9083, -7.909) -> (-16.1083, -7.909) centre (-8.5083, -14.5611) ccw
  line L28 (-0.9083, -7.909) -> (-0.9083, -20.9844)
  point P0 (29.0856, -4.4467)
  point P1 (23.0856, -26.4467)
  point P2 (9.4917, 2.1709)
  point P3 (23.0856, -26.4467)
  dimension "d84" = 5
  dimension "d94" = 0.5
  dimension "d96" = 0.5
  dimension "d97" = 0.1
  dimension "d98" = 0.1
  dimension "d99" = 0
extrude "Extrusion6" add sketch "Sketch4" along normal blind 2 contours L3 L1 L5 L0 | L10 L9 L8 L7 | L13 L14 L15 L16
extrude "Extrusion7" add sketch "Sketch4" against normal blind 2 contours L10 L9 L8 L7 | L13 L14 L15 L16
fillet "Fillet2" radius 3 6 edges at (0, -22, 27.249) (-57.1879, -22, 27.249) (0, 31.0434, 27.249) (-57.1879, 31.0434, 27.249) (0, 10.4676, 26.249) (-57.1879, 10.4676, 26.249)
properties part number "house_V6"
